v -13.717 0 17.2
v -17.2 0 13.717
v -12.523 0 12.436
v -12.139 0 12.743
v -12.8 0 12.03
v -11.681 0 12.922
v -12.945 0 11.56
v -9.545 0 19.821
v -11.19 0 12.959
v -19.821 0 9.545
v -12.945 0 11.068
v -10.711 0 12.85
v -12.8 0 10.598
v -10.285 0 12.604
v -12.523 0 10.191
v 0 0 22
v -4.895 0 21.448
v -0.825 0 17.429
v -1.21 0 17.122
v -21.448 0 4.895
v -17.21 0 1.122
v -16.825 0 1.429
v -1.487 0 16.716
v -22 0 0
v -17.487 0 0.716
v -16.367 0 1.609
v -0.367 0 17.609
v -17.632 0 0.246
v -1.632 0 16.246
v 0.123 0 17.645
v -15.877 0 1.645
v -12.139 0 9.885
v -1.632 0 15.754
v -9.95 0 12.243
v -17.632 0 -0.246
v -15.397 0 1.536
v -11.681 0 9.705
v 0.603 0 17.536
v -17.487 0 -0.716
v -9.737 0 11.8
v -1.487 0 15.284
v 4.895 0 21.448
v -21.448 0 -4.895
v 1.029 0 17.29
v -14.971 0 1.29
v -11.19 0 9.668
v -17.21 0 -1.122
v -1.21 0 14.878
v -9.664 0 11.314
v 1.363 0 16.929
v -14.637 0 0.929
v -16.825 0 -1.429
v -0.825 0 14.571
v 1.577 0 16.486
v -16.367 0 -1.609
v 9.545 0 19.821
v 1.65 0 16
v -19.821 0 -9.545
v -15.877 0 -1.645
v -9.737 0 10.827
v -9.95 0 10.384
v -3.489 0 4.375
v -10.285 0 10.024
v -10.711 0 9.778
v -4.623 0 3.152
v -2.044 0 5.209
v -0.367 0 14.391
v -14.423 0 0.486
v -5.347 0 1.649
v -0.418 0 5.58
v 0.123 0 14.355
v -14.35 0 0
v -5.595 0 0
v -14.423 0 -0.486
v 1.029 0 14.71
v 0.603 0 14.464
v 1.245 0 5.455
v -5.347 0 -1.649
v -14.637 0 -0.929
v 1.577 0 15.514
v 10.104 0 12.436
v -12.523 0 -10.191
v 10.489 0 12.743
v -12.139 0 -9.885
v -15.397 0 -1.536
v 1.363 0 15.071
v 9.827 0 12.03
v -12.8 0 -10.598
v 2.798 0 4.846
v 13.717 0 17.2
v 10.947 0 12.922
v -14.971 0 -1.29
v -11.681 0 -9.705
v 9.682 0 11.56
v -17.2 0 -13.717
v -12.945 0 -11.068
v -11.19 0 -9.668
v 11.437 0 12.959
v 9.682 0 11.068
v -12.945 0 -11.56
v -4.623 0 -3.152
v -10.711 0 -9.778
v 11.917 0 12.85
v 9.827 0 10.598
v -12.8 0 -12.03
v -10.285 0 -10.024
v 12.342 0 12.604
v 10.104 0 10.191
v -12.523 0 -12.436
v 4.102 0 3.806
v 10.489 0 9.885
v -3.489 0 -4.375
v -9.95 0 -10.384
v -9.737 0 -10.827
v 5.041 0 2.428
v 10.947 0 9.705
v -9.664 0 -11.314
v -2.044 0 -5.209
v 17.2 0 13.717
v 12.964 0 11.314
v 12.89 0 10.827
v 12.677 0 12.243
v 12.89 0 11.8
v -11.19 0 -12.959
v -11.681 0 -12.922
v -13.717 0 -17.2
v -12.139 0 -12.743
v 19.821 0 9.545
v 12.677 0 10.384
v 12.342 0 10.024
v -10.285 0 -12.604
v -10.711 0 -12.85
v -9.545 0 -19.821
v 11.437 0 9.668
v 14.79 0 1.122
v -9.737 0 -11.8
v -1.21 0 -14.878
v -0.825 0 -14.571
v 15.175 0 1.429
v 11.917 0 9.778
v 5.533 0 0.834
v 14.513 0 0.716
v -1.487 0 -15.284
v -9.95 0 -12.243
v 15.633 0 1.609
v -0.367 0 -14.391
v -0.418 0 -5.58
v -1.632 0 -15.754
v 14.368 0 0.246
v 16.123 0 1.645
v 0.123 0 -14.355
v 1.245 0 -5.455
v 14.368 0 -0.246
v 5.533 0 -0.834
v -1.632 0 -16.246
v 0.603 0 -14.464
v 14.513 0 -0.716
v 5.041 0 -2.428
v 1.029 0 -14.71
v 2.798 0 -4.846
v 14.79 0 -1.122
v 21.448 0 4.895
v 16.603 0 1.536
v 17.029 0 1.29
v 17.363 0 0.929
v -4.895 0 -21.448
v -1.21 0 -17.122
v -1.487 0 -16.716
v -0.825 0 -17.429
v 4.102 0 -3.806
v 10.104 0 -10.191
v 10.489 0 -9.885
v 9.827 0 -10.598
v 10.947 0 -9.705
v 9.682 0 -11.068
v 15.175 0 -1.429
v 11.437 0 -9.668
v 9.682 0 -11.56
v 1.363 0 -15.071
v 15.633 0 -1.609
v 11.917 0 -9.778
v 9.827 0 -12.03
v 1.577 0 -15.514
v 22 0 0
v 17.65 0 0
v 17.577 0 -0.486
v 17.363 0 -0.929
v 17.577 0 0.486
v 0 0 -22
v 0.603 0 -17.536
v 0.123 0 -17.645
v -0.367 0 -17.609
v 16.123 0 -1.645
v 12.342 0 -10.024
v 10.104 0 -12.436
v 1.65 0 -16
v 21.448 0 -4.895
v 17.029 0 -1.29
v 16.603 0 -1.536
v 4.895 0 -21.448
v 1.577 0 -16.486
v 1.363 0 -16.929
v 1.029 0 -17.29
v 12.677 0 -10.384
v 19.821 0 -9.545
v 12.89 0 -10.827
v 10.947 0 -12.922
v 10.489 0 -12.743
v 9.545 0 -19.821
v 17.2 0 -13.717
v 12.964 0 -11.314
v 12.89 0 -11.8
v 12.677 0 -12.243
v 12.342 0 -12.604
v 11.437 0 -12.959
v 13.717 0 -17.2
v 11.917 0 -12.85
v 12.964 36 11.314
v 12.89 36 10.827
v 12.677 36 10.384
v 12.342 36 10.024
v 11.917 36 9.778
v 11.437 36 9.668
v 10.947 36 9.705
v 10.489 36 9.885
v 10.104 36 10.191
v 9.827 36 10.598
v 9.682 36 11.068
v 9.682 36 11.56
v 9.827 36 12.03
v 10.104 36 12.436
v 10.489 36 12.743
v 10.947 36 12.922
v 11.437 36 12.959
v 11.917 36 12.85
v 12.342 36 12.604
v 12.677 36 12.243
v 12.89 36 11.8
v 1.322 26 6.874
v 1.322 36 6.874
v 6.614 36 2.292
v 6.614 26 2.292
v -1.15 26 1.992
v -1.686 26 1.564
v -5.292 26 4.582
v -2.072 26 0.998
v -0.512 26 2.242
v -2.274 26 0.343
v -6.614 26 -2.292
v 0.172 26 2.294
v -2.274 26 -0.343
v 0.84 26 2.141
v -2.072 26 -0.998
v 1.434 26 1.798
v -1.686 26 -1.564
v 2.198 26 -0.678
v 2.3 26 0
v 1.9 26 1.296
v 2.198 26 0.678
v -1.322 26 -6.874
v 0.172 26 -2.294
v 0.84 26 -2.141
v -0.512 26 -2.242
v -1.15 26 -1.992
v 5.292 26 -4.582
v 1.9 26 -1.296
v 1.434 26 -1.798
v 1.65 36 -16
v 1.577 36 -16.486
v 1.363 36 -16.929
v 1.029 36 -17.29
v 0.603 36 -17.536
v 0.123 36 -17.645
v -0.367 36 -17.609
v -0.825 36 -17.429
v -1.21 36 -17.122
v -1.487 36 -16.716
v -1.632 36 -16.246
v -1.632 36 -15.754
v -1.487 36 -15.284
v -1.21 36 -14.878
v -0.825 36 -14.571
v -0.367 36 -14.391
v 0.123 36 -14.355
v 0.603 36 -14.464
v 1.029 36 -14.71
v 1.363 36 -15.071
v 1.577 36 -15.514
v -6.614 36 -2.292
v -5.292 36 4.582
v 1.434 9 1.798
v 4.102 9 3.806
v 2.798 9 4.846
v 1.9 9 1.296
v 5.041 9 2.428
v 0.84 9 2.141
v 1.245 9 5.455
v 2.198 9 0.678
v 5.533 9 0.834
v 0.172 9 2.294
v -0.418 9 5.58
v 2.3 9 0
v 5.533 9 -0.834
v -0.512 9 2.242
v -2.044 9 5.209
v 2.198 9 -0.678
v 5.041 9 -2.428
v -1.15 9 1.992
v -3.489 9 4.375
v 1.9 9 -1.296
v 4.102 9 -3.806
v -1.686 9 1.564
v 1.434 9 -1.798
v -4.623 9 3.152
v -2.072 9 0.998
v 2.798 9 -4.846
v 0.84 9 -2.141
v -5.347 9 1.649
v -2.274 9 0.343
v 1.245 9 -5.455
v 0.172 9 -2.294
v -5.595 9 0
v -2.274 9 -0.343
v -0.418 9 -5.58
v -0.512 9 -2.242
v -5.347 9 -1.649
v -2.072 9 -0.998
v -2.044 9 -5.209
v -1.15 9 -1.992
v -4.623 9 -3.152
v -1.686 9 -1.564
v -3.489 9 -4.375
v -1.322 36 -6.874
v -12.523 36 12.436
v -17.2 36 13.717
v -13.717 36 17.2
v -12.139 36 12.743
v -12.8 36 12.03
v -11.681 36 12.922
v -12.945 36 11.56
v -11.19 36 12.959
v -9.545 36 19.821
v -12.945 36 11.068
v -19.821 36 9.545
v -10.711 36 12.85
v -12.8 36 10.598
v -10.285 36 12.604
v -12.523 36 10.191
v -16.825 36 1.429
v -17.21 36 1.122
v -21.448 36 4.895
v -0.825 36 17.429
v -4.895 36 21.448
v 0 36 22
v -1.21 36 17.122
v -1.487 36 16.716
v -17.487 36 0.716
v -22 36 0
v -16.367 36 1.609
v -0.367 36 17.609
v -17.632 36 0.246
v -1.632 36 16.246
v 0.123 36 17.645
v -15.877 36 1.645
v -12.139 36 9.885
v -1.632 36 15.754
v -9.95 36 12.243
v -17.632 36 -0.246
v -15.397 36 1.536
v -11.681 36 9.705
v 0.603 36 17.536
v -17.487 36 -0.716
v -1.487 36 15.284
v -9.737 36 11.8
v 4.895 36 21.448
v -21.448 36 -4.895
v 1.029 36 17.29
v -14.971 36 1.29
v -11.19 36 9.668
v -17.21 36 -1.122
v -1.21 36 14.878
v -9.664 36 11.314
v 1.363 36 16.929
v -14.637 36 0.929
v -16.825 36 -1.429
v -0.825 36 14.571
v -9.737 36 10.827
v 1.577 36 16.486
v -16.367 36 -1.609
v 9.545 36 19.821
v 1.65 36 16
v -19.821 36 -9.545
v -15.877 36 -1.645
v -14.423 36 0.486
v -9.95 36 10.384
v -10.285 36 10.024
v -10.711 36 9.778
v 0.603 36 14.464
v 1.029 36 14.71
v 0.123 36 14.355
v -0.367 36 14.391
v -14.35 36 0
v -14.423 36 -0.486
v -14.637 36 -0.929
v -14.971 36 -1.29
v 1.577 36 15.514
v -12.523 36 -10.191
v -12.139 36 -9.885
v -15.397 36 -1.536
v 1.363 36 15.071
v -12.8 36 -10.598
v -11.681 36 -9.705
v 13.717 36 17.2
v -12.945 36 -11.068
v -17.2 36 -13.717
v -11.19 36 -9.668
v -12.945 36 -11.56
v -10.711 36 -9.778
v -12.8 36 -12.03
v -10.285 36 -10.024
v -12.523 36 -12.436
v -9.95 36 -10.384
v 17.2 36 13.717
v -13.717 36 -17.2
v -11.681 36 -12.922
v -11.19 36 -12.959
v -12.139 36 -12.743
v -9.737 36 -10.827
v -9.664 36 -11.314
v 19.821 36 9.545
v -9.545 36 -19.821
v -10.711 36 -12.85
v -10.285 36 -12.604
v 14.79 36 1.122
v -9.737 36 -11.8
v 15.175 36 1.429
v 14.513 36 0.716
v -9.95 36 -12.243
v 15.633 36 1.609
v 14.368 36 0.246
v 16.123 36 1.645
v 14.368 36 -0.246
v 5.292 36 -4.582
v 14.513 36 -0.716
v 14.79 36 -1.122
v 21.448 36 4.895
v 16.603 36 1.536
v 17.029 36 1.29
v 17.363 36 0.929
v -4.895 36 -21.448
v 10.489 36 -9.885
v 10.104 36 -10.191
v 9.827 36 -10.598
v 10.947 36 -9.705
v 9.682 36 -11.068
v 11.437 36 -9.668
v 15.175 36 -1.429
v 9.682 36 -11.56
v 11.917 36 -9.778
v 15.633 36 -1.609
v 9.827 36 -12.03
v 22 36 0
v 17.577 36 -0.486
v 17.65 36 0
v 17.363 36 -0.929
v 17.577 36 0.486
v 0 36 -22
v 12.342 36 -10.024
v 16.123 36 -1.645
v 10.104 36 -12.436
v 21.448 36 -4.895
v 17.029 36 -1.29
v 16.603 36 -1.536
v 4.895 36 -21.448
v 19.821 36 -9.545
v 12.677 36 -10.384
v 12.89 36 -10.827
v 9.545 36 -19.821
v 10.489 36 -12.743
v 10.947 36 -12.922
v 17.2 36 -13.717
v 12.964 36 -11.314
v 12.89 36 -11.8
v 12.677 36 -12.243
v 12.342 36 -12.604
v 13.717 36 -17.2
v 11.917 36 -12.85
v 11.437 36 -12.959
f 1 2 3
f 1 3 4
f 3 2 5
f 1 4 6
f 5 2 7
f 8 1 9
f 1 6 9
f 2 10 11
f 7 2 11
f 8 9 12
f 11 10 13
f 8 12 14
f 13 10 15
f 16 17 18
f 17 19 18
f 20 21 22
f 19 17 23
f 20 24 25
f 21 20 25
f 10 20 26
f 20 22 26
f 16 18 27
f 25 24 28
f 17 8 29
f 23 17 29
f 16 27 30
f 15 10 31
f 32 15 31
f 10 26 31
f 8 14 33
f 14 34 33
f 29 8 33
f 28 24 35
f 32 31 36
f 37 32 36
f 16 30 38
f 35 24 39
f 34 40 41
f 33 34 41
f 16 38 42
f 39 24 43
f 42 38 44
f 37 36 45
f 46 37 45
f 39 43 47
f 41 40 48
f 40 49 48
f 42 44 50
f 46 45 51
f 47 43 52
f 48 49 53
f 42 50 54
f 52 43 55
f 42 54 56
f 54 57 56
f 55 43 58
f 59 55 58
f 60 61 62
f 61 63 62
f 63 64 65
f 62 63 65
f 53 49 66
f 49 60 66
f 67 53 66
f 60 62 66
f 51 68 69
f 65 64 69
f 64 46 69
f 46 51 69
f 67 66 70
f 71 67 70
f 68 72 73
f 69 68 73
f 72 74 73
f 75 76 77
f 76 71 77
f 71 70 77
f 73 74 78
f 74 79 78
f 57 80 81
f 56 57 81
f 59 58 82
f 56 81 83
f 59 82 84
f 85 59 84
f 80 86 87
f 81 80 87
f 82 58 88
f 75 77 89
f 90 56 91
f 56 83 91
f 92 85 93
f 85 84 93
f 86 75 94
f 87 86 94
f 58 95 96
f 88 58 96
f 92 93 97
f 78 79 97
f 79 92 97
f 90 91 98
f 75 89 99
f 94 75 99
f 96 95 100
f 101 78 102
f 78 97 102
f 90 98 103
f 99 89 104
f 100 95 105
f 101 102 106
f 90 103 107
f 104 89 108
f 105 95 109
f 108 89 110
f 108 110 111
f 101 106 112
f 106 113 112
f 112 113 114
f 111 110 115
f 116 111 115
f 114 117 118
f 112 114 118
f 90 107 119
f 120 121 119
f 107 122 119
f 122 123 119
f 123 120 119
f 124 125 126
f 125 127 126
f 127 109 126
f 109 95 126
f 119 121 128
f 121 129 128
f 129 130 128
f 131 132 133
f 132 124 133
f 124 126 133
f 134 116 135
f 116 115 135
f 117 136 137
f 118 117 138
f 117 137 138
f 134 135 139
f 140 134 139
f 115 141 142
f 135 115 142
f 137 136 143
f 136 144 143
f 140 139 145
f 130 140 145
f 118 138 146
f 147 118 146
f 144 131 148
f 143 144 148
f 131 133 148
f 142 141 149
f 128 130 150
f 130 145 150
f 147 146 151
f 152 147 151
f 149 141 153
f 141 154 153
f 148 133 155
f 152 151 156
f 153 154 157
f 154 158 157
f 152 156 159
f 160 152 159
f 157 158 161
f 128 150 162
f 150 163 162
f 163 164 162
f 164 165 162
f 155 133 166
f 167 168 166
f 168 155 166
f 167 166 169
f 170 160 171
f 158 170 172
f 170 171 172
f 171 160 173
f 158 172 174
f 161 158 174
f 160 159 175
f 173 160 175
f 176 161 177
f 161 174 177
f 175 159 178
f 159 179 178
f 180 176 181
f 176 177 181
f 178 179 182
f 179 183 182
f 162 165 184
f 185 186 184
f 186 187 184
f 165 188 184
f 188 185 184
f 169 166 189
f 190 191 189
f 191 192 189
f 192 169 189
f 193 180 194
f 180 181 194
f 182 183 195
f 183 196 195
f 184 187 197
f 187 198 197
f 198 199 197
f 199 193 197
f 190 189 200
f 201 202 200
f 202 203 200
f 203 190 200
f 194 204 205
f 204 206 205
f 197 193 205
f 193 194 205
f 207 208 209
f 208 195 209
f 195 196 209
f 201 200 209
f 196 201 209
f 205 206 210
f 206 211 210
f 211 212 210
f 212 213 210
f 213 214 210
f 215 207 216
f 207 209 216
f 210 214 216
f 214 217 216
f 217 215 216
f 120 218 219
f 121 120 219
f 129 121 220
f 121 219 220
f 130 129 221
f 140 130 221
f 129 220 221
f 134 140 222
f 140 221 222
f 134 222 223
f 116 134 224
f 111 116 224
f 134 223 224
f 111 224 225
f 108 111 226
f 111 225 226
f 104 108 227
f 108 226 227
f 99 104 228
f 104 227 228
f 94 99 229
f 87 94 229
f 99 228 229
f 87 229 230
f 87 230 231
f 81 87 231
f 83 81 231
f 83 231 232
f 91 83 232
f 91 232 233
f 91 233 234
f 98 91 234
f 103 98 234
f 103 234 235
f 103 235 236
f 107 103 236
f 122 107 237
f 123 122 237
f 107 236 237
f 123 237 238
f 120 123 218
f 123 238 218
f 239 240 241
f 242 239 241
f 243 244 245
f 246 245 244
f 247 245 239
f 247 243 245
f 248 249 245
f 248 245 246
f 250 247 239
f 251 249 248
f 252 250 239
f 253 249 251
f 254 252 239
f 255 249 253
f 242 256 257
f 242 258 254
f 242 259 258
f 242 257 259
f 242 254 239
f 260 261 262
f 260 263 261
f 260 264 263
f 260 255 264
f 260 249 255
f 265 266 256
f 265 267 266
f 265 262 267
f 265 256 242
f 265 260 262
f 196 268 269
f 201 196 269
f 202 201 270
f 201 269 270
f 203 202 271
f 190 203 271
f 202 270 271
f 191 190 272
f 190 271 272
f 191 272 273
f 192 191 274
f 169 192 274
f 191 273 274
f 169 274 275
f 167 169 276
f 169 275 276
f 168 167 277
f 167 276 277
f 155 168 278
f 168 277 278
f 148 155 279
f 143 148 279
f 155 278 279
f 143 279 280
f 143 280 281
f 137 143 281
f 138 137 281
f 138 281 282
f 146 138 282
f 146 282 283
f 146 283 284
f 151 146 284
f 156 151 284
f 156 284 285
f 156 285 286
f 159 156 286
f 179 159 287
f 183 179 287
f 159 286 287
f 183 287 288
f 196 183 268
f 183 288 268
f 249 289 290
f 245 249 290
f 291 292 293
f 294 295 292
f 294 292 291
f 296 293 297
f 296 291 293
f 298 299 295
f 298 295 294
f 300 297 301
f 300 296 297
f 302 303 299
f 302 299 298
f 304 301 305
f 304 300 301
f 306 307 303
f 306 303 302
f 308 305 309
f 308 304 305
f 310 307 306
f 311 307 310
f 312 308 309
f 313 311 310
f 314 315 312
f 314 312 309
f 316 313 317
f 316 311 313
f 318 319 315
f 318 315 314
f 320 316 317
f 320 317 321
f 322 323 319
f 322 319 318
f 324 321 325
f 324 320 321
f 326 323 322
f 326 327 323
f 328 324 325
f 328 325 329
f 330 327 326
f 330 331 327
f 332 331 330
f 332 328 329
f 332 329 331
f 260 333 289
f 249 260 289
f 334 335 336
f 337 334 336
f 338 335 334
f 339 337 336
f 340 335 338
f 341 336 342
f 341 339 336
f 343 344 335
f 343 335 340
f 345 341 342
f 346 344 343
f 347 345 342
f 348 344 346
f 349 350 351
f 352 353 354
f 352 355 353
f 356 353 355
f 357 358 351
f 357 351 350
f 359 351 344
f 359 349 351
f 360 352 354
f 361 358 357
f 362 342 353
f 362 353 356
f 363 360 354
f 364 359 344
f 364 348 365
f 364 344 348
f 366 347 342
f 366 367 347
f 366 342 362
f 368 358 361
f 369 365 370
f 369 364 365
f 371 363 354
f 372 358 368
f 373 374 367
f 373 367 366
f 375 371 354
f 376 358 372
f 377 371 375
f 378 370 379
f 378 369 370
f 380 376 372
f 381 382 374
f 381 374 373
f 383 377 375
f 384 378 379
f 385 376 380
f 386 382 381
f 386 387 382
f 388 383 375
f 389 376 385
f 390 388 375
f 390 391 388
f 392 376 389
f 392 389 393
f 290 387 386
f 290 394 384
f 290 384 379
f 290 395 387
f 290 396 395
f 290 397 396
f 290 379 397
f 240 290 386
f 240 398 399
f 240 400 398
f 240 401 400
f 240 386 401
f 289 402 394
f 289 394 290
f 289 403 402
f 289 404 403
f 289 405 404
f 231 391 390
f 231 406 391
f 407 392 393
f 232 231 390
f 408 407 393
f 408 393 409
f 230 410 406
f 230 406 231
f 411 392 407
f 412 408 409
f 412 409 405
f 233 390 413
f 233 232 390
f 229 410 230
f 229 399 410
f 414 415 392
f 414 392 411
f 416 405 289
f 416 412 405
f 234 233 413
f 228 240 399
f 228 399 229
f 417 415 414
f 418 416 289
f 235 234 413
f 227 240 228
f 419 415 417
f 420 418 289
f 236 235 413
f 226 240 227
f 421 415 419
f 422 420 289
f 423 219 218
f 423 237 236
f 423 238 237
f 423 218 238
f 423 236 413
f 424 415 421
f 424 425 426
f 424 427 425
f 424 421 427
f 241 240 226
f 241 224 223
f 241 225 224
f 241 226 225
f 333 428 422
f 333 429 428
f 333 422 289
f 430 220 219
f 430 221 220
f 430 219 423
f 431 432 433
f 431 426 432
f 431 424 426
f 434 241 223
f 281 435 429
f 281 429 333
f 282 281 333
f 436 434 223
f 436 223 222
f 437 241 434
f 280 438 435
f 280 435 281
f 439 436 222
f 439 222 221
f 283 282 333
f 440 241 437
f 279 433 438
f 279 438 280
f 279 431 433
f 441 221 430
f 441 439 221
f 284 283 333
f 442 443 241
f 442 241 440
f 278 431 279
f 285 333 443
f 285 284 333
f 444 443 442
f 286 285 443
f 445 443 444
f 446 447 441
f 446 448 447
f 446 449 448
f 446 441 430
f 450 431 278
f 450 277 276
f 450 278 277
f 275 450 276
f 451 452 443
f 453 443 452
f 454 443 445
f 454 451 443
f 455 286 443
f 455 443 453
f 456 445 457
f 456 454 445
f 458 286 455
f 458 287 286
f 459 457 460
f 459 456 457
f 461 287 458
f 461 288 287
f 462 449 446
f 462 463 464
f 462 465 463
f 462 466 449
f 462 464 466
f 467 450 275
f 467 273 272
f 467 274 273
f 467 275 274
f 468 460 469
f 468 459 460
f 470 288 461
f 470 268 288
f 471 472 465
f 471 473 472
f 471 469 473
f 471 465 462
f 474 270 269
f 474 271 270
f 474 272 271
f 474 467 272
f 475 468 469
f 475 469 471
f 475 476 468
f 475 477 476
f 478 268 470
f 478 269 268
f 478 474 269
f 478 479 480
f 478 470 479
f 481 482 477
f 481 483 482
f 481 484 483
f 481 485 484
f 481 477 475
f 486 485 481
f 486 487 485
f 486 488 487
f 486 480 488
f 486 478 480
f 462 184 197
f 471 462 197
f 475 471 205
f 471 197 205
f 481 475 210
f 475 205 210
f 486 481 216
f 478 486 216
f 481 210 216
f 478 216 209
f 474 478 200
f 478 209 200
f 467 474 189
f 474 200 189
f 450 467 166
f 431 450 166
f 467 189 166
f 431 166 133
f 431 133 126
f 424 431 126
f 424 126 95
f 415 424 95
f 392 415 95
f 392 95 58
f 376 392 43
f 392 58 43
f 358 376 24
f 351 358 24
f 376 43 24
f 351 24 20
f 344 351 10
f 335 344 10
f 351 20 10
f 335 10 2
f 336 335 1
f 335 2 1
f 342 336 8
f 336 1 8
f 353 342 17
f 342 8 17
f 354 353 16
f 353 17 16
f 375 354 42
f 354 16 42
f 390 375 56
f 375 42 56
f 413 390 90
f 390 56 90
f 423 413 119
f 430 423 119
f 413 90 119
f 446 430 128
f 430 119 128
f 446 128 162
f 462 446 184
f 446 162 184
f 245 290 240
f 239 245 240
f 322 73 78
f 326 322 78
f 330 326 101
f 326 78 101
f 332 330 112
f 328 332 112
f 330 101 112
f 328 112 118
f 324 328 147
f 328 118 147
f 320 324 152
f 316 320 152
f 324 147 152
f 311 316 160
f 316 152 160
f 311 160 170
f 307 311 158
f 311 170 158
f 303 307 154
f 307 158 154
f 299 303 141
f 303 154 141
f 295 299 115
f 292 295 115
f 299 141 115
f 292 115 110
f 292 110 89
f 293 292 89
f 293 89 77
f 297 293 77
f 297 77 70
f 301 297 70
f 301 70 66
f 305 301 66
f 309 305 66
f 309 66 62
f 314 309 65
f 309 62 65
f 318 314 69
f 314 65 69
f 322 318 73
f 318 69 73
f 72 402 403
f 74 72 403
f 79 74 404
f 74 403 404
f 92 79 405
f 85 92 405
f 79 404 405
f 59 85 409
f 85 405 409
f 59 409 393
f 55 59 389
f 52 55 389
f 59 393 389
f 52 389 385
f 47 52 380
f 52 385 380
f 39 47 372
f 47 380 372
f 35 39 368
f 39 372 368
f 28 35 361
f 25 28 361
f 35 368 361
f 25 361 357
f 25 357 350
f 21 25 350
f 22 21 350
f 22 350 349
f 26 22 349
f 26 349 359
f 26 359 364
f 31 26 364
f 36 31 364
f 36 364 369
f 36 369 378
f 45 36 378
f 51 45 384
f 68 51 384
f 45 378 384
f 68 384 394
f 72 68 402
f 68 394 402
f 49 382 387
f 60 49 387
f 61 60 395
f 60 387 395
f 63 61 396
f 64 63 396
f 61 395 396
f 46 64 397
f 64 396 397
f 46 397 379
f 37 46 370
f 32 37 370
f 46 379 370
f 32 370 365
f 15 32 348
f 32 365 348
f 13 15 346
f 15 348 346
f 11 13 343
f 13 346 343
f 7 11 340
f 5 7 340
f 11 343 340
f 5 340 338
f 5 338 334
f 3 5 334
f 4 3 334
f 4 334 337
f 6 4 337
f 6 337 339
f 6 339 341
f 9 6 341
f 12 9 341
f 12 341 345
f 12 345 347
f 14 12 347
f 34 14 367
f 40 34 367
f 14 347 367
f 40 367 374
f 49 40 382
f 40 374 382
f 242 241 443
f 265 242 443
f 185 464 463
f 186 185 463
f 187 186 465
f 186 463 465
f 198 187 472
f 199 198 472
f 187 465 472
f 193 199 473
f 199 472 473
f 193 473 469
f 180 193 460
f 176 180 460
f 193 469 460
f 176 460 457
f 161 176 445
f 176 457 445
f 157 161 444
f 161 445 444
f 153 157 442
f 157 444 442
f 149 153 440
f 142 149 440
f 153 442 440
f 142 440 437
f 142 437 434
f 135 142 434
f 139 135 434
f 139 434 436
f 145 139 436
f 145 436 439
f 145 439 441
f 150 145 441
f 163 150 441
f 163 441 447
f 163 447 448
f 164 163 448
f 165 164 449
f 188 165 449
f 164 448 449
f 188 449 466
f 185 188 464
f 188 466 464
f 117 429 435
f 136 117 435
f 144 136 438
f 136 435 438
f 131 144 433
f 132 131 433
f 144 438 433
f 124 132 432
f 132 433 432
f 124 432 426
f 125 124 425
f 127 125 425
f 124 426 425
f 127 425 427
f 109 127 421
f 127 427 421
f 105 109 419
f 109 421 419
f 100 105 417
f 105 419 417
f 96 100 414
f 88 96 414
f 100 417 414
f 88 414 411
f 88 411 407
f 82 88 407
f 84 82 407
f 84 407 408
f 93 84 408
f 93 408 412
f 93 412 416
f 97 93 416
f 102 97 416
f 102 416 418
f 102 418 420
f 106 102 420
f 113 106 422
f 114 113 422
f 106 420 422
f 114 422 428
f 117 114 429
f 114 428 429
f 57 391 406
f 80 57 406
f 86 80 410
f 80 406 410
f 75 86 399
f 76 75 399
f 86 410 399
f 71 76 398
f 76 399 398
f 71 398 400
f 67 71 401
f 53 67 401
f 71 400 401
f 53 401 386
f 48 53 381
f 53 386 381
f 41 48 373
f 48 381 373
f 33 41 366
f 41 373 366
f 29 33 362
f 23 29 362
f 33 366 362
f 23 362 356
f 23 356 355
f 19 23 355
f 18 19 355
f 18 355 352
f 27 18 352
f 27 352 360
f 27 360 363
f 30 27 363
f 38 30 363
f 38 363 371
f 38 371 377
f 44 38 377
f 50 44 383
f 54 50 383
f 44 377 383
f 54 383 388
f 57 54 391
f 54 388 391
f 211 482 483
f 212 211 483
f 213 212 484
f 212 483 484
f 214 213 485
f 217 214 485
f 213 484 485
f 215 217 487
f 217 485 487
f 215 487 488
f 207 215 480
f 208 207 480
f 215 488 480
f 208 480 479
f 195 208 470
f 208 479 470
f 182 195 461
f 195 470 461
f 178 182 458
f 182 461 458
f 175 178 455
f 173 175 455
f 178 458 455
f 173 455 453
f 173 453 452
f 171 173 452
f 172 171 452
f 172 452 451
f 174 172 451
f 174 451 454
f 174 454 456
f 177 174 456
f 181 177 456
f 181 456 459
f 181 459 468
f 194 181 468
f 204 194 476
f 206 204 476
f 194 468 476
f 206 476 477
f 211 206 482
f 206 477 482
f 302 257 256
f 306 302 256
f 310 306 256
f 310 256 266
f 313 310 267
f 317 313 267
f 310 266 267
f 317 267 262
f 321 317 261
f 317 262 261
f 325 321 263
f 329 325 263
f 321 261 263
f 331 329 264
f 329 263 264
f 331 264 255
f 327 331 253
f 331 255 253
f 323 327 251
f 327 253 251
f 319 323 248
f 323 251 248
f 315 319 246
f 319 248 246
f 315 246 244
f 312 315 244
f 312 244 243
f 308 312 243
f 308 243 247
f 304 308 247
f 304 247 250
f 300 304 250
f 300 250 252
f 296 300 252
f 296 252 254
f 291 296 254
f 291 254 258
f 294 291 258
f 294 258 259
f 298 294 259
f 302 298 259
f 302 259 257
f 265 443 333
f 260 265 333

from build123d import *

# Parameters (mm, degrees)
SKETCH1_R           = 22
BOSS_EXTRUDE1_DEPTH = 36
SKETCH2_R           = 1.65
CUT_EXTRUDE1_DEPTH  = 36
CUT_EXTRUDE2_DEPTH  = 10
SKETCH4_R           = 2.3
CUT_EXTRUDE3_DEPTH  = 38
SKETCH5_R           = 5.59540043
CUT_EXTRUDE4_DEPTH  = 9


with BuildPart() as part:
    # Sketch1 → Boss-Extrude1 (new body)
    with BuildSketch(Plane(origin=(0, 0, 0), x_dir=(1, 0, 0), z_dir=(0, 1, 0))):
        Circle(SKETCH1_R)
    extrude(amount=BOSS_EXTRUDE1_DEPTH)

    # Sketch2 → Cut-Extrude1 (cut)
    with BuildSketch(Plane(origin=(0, 36, 0), x_dir=(1, 0, 0), z_dir=(0, 1, 0))):
        with Locations((-11.313708499, 11.313708499)):
            Circle(SKETCH2_R)
        with Locations((0, 16)):
            Circle(SKETCH2_R)
        with Locations((16, 0)):
            Circle(SKETCH2_R)
        with Locations((11.313708499, 11.313708499)):
            Circle(SKETCH2_R)
        with Locations((0, -16)):
            Circle(SKETCH2_R)
        with Locations((11.313708499, -11.313708499)):
            Circle(SKETCH2_R)
        with Locations((-16, 0)):
            Circle(SKETCH2_R)
        with Locations((-11.313708499, -11.313708499)):
            Circle(SKETCH2_R)
    extrude(amount=-CUT_EXTRUDE1_DEPTH, mode=Mode.SUBTRACT)

    # Sketch3 → Cut-Extrude2 (cut)
    with BuildSketch(Plane(origin=(0, 36, 0), x_dir=(1, 0, 0), z_dir=(0, 1, 0))):
        Polygon((1.321693068, -6.874091026), (6.613983991, -2.29242574), (5.292290922, 4.581665286), (-1.321693068, 6.874091026), (-6.613983991, 2.29242574), (-5.292290922, -4.581665286), align=None)
    extrude(amount=-CUT_EXTRUDE2_DEPTH, mode=Mode.SUBTRACT)

    # Sketch4 → Cut-Extrude3 (cut)
    with BuildSketch(Plane(origin=(0, 26, 0), x_dir=(1, 0, 0), z_dir=(0, 1, 0))):
        Circle(SKETCH4_R)
    extrude(amount=-CUT_EXTRUDE3_DEPTH, mode=Mode.SUBTRACT)

    # Sketch5 → Cut-Extrude4 (cut)
    with BuildSketch(Plane(origin=(0, 0, 0), x_dir=(-1, 0, 0), z_dir=(0, -1, 0))):
        Circle(SKETCH5_R)
    extrude(amount=-CUT_EXTRUDE4_DEPTH, mode=Mode.SUBTRACT)


solid = part.part
